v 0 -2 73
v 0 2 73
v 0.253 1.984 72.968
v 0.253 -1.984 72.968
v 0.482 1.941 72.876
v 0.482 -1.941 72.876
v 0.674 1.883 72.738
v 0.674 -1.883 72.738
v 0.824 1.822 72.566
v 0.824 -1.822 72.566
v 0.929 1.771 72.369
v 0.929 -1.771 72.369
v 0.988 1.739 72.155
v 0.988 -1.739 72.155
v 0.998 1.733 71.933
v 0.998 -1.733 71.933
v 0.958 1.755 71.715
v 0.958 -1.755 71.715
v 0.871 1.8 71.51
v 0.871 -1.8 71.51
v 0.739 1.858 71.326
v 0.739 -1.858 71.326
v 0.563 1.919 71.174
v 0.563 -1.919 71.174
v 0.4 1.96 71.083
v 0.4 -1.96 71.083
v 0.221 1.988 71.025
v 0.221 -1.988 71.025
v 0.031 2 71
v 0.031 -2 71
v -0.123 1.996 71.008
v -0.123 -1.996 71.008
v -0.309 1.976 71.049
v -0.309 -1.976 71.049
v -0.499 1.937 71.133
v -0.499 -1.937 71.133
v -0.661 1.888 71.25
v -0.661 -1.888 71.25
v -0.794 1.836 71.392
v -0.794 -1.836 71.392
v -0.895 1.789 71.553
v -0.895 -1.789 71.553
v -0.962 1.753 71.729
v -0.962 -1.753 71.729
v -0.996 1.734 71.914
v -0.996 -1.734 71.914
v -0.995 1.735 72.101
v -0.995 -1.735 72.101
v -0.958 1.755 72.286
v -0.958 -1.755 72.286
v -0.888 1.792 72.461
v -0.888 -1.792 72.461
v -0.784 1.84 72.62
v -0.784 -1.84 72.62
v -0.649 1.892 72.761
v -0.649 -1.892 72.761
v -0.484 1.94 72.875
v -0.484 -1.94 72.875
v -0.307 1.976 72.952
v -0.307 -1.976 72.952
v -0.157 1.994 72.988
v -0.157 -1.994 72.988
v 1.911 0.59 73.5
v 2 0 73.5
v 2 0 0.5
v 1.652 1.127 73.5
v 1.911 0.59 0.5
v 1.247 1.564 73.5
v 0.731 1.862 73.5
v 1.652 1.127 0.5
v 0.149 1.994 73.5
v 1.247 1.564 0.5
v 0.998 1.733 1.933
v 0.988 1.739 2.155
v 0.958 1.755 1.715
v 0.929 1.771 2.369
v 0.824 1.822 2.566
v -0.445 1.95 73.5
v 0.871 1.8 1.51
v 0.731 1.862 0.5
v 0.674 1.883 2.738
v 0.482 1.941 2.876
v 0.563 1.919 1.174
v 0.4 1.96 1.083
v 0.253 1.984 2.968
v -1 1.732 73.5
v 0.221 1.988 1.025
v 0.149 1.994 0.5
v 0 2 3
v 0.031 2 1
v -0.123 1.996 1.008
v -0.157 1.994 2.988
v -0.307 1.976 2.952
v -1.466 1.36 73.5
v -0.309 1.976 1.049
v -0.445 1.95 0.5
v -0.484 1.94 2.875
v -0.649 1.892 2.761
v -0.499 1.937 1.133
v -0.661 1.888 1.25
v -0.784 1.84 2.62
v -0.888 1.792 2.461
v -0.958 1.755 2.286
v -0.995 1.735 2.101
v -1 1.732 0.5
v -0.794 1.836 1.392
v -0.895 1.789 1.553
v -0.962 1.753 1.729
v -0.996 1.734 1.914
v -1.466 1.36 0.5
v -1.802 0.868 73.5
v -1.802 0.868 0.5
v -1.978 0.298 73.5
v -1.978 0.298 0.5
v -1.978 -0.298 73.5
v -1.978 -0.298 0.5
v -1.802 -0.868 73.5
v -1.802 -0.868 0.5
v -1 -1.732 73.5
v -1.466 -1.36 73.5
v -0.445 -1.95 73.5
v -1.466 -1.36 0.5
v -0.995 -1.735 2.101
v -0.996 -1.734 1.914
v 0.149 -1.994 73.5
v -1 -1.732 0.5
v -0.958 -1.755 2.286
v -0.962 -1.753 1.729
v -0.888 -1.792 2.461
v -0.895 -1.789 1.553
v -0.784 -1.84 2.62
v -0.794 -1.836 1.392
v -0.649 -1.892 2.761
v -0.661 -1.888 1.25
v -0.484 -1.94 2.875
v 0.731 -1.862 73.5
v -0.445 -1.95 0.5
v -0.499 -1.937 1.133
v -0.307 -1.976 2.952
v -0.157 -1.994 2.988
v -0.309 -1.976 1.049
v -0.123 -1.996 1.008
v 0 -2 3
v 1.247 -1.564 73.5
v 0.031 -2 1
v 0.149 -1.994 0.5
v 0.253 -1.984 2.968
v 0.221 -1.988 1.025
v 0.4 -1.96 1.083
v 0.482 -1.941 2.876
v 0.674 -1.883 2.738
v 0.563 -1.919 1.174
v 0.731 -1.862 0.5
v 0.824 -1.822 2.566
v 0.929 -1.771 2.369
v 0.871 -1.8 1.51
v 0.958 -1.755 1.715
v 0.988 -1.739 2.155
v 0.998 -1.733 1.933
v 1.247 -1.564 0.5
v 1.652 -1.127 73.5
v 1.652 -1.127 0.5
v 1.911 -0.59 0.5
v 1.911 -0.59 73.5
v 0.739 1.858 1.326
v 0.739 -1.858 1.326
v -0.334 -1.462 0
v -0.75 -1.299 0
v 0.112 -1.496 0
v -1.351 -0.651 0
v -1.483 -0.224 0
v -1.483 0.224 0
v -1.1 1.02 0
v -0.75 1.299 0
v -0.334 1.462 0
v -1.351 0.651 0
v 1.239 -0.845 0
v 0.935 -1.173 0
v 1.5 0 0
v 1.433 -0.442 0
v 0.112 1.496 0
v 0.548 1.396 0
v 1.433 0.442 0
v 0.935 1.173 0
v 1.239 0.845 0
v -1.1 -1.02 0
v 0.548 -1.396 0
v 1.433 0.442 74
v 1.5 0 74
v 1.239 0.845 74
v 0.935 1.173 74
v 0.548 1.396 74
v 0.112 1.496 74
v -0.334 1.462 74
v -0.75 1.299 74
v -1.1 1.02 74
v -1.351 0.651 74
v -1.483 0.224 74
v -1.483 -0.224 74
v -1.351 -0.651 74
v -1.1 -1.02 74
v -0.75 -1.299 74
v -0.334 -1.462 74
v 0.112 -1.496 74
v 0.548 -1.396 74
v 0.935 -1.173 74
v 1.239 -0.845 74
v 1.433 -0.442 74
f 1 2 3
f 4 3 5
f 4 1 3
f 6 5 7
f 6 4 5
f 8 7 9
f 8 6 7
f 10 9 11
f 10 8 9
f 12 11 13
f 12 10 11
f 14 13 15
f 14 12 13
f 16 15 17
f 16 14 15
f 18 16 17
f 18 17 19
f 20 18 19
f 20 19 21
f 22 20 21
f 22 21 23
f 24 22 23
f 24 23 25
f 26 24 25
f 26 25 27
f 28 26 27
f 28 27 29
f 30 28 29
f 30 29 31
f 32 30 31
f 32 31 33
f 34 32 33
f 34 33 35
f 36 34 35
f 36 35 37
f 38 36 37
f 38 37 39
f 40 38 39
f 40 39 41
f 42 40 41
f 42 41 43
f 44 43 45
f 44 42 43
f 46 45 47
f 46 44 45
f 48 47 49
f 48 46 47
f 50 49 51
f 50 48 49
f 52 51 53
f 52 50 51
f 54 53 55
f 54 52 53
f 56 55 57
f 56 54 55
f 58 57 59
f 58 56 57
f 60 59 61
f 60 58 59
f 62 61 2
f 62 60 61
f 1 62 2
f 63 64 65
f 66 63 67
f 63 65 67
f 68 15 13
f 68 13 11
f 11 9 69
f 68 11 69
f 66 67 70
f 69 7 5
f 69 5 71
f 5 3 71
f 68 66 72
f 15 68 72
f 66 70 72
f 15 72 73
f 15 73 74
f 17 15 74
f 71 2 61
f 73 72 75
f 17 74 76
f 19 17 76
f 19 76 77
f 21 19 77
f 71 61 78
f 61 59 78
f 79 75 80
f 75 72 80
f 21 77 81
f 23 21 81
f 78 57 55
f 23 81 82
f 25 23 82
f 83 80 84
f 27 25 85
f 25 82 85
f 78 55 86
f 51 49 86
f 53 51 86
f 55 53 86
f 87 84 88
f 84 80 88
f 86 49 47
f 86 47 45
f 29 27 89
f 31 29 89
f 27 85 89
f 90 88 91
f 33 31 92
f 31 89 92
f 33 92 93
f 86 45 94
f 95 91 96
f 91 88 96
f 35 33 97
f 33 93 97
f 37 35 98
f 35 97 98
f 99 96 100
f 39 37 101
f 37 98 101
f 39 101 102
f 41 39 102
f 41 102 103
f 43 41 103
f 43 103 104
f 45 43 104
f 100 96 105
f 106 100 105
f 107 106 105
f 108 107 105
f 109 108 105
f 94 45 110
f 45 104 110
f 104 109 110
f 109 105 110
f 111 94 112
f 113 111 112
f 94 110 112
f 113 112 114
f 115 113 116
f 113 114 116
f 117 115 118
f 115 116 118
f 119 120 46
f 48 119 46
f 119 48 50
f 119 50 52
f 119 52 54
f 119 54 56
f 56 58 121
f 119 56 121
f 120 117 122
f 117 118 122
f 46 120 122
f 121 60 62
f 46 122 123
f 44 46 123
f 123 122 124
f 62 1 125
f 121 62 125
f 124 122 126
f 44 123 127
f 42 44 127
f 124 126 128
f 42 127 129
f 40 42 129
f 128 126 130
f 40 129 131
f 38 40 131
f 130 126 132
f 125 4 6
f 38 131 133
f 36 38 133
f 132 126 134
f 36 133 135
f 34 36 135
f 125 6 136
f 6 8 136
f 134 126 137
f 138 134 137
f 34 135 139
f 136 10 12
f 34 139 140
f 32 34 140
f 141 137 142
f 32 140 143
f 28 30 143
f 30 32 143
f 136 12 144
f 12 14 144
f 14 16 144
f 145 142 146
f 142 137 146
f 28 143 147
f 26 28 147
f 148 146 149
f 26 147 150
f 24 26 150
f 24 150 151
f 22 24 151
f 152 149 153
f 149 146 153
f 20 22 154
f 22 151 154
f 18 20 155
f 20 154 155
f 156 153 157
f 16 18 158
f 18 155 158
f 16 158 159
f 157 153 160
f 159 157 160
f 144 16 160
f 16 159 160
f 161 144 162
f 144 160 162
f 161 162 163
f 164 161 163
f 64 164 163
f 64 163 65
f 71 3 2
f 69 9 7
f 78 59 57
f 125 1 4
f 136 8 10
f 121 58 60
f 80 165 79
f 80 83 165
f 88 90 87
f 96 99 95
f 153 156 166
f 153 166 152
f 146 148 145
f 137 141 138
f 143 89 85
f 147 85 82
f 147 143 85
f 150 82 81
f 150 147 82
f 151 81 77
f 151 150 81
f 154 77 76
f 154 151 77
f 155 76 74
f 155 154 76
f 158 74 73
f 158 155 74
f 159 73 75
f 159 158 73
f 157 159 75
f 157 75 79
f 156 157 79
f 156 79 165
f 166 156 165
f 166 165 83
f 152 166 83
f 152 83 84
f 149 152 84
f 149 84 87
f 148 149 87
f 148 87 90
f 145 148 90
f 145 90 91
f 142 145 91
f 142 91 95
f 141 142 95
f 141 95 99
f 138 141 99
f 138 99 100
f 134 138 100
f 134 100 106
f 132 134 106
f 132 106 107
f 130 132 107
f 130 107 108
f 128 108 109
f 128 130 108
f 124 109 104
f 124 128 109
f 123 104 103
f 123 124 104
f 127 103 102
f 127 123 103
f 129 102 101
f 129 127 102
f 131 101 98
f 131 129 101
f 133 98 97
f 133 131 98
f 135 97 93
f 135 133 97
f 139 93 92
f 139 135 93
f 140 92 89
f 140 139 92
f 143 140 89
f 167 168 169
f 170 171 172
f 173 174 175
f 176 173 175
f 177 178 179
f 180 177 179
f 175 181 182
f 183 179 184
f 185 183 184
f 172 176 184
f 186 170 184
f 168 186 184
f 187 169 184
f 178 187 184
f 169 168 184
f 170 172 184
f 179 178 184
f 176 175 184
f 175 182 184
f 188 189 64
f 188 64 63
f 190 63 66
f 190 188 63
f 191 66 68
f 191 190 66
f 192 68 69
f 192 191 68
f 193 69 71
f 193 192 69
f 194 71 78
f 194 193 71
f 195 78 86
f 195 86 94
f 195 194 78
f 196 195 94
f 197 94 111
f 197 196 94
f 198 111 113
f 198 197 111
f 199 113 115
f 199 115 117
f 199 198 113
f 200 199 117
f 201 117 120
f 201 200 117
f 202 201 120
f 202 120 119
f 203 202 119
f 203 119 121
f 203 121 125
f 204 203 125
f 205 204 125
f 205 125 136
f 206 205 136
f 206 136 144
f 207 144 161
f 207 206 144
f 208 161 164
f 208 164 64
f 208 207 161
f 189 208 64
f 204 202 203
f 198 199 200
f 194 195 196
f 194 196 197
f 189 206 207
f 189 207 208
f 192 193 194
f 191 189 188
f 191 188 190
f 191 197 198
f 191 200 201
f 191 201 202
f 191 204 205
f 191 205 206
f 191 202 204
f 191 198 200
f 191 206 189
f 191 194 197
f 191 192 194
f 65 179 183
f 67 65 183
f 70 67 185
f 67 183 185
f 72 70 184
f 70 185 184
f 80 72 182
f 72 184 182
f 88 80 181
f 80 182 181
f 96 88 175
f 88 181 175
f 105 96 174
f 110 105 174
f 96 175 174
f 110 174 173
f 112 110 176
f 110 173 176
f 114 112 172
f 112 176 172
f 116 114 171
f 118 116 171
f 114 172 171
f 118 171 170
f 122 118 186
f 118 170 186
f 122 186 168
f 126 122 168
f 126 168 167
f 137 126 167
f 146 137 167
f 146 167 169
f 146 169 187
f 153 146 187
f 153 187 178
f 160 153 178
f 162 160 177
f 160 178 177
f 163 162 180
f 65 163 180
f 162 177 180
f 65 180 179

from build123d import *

# Parameters (mm, degrees)
SKETCH_1_R               = 2
EXTRUDE_1_DEPTH          = 74
CHAMFER_1_SIZE           = 0.5
CUT_EXTRUDE_1_DEPTH      = 75.054034326
CUT_EXTRUDE_1_DEPTH_BACK = 75.054034326
SKETCH_2_R               = 1


with BuildPart() as part:
    # 草圖1 → 填料-伸長1 (new body)
    with BuildSketch(Plane.XY):
        Circle(SKETCH_1_R)
    extrude(amount=EXTRUDE_1_DEPTH)

    # 導角1
    chamfer_1_edges = [part.edges().sort_by_distance(p)[0] for p in [
        (-2, 0, 0),
        (-2, 0, 74),
    ]]
    chamfer(chamfer_1_edges, length=CHAMFER_1_SIZE)

    # 草圖2 → 除料-伸長1 (cut, two sides: drawn at the far end of the back side and taken through both)
    with BuildSketch(Plane(origin=(0, 0, 0), x_dir=(1, 0, 0), z_dir=(0, 1, 0)).offset(-CUT_EXTRUDE_1_DEPTH_BACK)):
        with Locations(Location((0, -2, 0), (0, 0, 270))):
            Circle(SKETCH_2_R)
        with Locations(Location((0, -72, 0), (0, 0, 270))):
            Circle(SKETCH_2_R)
    extrude(amount=CUT_EXTRUDE_1_DEPTH + CUT_EXTRUDE_1_DEPTH_BACK, mode=Mode.SUBTRACT)


solid = part.part
